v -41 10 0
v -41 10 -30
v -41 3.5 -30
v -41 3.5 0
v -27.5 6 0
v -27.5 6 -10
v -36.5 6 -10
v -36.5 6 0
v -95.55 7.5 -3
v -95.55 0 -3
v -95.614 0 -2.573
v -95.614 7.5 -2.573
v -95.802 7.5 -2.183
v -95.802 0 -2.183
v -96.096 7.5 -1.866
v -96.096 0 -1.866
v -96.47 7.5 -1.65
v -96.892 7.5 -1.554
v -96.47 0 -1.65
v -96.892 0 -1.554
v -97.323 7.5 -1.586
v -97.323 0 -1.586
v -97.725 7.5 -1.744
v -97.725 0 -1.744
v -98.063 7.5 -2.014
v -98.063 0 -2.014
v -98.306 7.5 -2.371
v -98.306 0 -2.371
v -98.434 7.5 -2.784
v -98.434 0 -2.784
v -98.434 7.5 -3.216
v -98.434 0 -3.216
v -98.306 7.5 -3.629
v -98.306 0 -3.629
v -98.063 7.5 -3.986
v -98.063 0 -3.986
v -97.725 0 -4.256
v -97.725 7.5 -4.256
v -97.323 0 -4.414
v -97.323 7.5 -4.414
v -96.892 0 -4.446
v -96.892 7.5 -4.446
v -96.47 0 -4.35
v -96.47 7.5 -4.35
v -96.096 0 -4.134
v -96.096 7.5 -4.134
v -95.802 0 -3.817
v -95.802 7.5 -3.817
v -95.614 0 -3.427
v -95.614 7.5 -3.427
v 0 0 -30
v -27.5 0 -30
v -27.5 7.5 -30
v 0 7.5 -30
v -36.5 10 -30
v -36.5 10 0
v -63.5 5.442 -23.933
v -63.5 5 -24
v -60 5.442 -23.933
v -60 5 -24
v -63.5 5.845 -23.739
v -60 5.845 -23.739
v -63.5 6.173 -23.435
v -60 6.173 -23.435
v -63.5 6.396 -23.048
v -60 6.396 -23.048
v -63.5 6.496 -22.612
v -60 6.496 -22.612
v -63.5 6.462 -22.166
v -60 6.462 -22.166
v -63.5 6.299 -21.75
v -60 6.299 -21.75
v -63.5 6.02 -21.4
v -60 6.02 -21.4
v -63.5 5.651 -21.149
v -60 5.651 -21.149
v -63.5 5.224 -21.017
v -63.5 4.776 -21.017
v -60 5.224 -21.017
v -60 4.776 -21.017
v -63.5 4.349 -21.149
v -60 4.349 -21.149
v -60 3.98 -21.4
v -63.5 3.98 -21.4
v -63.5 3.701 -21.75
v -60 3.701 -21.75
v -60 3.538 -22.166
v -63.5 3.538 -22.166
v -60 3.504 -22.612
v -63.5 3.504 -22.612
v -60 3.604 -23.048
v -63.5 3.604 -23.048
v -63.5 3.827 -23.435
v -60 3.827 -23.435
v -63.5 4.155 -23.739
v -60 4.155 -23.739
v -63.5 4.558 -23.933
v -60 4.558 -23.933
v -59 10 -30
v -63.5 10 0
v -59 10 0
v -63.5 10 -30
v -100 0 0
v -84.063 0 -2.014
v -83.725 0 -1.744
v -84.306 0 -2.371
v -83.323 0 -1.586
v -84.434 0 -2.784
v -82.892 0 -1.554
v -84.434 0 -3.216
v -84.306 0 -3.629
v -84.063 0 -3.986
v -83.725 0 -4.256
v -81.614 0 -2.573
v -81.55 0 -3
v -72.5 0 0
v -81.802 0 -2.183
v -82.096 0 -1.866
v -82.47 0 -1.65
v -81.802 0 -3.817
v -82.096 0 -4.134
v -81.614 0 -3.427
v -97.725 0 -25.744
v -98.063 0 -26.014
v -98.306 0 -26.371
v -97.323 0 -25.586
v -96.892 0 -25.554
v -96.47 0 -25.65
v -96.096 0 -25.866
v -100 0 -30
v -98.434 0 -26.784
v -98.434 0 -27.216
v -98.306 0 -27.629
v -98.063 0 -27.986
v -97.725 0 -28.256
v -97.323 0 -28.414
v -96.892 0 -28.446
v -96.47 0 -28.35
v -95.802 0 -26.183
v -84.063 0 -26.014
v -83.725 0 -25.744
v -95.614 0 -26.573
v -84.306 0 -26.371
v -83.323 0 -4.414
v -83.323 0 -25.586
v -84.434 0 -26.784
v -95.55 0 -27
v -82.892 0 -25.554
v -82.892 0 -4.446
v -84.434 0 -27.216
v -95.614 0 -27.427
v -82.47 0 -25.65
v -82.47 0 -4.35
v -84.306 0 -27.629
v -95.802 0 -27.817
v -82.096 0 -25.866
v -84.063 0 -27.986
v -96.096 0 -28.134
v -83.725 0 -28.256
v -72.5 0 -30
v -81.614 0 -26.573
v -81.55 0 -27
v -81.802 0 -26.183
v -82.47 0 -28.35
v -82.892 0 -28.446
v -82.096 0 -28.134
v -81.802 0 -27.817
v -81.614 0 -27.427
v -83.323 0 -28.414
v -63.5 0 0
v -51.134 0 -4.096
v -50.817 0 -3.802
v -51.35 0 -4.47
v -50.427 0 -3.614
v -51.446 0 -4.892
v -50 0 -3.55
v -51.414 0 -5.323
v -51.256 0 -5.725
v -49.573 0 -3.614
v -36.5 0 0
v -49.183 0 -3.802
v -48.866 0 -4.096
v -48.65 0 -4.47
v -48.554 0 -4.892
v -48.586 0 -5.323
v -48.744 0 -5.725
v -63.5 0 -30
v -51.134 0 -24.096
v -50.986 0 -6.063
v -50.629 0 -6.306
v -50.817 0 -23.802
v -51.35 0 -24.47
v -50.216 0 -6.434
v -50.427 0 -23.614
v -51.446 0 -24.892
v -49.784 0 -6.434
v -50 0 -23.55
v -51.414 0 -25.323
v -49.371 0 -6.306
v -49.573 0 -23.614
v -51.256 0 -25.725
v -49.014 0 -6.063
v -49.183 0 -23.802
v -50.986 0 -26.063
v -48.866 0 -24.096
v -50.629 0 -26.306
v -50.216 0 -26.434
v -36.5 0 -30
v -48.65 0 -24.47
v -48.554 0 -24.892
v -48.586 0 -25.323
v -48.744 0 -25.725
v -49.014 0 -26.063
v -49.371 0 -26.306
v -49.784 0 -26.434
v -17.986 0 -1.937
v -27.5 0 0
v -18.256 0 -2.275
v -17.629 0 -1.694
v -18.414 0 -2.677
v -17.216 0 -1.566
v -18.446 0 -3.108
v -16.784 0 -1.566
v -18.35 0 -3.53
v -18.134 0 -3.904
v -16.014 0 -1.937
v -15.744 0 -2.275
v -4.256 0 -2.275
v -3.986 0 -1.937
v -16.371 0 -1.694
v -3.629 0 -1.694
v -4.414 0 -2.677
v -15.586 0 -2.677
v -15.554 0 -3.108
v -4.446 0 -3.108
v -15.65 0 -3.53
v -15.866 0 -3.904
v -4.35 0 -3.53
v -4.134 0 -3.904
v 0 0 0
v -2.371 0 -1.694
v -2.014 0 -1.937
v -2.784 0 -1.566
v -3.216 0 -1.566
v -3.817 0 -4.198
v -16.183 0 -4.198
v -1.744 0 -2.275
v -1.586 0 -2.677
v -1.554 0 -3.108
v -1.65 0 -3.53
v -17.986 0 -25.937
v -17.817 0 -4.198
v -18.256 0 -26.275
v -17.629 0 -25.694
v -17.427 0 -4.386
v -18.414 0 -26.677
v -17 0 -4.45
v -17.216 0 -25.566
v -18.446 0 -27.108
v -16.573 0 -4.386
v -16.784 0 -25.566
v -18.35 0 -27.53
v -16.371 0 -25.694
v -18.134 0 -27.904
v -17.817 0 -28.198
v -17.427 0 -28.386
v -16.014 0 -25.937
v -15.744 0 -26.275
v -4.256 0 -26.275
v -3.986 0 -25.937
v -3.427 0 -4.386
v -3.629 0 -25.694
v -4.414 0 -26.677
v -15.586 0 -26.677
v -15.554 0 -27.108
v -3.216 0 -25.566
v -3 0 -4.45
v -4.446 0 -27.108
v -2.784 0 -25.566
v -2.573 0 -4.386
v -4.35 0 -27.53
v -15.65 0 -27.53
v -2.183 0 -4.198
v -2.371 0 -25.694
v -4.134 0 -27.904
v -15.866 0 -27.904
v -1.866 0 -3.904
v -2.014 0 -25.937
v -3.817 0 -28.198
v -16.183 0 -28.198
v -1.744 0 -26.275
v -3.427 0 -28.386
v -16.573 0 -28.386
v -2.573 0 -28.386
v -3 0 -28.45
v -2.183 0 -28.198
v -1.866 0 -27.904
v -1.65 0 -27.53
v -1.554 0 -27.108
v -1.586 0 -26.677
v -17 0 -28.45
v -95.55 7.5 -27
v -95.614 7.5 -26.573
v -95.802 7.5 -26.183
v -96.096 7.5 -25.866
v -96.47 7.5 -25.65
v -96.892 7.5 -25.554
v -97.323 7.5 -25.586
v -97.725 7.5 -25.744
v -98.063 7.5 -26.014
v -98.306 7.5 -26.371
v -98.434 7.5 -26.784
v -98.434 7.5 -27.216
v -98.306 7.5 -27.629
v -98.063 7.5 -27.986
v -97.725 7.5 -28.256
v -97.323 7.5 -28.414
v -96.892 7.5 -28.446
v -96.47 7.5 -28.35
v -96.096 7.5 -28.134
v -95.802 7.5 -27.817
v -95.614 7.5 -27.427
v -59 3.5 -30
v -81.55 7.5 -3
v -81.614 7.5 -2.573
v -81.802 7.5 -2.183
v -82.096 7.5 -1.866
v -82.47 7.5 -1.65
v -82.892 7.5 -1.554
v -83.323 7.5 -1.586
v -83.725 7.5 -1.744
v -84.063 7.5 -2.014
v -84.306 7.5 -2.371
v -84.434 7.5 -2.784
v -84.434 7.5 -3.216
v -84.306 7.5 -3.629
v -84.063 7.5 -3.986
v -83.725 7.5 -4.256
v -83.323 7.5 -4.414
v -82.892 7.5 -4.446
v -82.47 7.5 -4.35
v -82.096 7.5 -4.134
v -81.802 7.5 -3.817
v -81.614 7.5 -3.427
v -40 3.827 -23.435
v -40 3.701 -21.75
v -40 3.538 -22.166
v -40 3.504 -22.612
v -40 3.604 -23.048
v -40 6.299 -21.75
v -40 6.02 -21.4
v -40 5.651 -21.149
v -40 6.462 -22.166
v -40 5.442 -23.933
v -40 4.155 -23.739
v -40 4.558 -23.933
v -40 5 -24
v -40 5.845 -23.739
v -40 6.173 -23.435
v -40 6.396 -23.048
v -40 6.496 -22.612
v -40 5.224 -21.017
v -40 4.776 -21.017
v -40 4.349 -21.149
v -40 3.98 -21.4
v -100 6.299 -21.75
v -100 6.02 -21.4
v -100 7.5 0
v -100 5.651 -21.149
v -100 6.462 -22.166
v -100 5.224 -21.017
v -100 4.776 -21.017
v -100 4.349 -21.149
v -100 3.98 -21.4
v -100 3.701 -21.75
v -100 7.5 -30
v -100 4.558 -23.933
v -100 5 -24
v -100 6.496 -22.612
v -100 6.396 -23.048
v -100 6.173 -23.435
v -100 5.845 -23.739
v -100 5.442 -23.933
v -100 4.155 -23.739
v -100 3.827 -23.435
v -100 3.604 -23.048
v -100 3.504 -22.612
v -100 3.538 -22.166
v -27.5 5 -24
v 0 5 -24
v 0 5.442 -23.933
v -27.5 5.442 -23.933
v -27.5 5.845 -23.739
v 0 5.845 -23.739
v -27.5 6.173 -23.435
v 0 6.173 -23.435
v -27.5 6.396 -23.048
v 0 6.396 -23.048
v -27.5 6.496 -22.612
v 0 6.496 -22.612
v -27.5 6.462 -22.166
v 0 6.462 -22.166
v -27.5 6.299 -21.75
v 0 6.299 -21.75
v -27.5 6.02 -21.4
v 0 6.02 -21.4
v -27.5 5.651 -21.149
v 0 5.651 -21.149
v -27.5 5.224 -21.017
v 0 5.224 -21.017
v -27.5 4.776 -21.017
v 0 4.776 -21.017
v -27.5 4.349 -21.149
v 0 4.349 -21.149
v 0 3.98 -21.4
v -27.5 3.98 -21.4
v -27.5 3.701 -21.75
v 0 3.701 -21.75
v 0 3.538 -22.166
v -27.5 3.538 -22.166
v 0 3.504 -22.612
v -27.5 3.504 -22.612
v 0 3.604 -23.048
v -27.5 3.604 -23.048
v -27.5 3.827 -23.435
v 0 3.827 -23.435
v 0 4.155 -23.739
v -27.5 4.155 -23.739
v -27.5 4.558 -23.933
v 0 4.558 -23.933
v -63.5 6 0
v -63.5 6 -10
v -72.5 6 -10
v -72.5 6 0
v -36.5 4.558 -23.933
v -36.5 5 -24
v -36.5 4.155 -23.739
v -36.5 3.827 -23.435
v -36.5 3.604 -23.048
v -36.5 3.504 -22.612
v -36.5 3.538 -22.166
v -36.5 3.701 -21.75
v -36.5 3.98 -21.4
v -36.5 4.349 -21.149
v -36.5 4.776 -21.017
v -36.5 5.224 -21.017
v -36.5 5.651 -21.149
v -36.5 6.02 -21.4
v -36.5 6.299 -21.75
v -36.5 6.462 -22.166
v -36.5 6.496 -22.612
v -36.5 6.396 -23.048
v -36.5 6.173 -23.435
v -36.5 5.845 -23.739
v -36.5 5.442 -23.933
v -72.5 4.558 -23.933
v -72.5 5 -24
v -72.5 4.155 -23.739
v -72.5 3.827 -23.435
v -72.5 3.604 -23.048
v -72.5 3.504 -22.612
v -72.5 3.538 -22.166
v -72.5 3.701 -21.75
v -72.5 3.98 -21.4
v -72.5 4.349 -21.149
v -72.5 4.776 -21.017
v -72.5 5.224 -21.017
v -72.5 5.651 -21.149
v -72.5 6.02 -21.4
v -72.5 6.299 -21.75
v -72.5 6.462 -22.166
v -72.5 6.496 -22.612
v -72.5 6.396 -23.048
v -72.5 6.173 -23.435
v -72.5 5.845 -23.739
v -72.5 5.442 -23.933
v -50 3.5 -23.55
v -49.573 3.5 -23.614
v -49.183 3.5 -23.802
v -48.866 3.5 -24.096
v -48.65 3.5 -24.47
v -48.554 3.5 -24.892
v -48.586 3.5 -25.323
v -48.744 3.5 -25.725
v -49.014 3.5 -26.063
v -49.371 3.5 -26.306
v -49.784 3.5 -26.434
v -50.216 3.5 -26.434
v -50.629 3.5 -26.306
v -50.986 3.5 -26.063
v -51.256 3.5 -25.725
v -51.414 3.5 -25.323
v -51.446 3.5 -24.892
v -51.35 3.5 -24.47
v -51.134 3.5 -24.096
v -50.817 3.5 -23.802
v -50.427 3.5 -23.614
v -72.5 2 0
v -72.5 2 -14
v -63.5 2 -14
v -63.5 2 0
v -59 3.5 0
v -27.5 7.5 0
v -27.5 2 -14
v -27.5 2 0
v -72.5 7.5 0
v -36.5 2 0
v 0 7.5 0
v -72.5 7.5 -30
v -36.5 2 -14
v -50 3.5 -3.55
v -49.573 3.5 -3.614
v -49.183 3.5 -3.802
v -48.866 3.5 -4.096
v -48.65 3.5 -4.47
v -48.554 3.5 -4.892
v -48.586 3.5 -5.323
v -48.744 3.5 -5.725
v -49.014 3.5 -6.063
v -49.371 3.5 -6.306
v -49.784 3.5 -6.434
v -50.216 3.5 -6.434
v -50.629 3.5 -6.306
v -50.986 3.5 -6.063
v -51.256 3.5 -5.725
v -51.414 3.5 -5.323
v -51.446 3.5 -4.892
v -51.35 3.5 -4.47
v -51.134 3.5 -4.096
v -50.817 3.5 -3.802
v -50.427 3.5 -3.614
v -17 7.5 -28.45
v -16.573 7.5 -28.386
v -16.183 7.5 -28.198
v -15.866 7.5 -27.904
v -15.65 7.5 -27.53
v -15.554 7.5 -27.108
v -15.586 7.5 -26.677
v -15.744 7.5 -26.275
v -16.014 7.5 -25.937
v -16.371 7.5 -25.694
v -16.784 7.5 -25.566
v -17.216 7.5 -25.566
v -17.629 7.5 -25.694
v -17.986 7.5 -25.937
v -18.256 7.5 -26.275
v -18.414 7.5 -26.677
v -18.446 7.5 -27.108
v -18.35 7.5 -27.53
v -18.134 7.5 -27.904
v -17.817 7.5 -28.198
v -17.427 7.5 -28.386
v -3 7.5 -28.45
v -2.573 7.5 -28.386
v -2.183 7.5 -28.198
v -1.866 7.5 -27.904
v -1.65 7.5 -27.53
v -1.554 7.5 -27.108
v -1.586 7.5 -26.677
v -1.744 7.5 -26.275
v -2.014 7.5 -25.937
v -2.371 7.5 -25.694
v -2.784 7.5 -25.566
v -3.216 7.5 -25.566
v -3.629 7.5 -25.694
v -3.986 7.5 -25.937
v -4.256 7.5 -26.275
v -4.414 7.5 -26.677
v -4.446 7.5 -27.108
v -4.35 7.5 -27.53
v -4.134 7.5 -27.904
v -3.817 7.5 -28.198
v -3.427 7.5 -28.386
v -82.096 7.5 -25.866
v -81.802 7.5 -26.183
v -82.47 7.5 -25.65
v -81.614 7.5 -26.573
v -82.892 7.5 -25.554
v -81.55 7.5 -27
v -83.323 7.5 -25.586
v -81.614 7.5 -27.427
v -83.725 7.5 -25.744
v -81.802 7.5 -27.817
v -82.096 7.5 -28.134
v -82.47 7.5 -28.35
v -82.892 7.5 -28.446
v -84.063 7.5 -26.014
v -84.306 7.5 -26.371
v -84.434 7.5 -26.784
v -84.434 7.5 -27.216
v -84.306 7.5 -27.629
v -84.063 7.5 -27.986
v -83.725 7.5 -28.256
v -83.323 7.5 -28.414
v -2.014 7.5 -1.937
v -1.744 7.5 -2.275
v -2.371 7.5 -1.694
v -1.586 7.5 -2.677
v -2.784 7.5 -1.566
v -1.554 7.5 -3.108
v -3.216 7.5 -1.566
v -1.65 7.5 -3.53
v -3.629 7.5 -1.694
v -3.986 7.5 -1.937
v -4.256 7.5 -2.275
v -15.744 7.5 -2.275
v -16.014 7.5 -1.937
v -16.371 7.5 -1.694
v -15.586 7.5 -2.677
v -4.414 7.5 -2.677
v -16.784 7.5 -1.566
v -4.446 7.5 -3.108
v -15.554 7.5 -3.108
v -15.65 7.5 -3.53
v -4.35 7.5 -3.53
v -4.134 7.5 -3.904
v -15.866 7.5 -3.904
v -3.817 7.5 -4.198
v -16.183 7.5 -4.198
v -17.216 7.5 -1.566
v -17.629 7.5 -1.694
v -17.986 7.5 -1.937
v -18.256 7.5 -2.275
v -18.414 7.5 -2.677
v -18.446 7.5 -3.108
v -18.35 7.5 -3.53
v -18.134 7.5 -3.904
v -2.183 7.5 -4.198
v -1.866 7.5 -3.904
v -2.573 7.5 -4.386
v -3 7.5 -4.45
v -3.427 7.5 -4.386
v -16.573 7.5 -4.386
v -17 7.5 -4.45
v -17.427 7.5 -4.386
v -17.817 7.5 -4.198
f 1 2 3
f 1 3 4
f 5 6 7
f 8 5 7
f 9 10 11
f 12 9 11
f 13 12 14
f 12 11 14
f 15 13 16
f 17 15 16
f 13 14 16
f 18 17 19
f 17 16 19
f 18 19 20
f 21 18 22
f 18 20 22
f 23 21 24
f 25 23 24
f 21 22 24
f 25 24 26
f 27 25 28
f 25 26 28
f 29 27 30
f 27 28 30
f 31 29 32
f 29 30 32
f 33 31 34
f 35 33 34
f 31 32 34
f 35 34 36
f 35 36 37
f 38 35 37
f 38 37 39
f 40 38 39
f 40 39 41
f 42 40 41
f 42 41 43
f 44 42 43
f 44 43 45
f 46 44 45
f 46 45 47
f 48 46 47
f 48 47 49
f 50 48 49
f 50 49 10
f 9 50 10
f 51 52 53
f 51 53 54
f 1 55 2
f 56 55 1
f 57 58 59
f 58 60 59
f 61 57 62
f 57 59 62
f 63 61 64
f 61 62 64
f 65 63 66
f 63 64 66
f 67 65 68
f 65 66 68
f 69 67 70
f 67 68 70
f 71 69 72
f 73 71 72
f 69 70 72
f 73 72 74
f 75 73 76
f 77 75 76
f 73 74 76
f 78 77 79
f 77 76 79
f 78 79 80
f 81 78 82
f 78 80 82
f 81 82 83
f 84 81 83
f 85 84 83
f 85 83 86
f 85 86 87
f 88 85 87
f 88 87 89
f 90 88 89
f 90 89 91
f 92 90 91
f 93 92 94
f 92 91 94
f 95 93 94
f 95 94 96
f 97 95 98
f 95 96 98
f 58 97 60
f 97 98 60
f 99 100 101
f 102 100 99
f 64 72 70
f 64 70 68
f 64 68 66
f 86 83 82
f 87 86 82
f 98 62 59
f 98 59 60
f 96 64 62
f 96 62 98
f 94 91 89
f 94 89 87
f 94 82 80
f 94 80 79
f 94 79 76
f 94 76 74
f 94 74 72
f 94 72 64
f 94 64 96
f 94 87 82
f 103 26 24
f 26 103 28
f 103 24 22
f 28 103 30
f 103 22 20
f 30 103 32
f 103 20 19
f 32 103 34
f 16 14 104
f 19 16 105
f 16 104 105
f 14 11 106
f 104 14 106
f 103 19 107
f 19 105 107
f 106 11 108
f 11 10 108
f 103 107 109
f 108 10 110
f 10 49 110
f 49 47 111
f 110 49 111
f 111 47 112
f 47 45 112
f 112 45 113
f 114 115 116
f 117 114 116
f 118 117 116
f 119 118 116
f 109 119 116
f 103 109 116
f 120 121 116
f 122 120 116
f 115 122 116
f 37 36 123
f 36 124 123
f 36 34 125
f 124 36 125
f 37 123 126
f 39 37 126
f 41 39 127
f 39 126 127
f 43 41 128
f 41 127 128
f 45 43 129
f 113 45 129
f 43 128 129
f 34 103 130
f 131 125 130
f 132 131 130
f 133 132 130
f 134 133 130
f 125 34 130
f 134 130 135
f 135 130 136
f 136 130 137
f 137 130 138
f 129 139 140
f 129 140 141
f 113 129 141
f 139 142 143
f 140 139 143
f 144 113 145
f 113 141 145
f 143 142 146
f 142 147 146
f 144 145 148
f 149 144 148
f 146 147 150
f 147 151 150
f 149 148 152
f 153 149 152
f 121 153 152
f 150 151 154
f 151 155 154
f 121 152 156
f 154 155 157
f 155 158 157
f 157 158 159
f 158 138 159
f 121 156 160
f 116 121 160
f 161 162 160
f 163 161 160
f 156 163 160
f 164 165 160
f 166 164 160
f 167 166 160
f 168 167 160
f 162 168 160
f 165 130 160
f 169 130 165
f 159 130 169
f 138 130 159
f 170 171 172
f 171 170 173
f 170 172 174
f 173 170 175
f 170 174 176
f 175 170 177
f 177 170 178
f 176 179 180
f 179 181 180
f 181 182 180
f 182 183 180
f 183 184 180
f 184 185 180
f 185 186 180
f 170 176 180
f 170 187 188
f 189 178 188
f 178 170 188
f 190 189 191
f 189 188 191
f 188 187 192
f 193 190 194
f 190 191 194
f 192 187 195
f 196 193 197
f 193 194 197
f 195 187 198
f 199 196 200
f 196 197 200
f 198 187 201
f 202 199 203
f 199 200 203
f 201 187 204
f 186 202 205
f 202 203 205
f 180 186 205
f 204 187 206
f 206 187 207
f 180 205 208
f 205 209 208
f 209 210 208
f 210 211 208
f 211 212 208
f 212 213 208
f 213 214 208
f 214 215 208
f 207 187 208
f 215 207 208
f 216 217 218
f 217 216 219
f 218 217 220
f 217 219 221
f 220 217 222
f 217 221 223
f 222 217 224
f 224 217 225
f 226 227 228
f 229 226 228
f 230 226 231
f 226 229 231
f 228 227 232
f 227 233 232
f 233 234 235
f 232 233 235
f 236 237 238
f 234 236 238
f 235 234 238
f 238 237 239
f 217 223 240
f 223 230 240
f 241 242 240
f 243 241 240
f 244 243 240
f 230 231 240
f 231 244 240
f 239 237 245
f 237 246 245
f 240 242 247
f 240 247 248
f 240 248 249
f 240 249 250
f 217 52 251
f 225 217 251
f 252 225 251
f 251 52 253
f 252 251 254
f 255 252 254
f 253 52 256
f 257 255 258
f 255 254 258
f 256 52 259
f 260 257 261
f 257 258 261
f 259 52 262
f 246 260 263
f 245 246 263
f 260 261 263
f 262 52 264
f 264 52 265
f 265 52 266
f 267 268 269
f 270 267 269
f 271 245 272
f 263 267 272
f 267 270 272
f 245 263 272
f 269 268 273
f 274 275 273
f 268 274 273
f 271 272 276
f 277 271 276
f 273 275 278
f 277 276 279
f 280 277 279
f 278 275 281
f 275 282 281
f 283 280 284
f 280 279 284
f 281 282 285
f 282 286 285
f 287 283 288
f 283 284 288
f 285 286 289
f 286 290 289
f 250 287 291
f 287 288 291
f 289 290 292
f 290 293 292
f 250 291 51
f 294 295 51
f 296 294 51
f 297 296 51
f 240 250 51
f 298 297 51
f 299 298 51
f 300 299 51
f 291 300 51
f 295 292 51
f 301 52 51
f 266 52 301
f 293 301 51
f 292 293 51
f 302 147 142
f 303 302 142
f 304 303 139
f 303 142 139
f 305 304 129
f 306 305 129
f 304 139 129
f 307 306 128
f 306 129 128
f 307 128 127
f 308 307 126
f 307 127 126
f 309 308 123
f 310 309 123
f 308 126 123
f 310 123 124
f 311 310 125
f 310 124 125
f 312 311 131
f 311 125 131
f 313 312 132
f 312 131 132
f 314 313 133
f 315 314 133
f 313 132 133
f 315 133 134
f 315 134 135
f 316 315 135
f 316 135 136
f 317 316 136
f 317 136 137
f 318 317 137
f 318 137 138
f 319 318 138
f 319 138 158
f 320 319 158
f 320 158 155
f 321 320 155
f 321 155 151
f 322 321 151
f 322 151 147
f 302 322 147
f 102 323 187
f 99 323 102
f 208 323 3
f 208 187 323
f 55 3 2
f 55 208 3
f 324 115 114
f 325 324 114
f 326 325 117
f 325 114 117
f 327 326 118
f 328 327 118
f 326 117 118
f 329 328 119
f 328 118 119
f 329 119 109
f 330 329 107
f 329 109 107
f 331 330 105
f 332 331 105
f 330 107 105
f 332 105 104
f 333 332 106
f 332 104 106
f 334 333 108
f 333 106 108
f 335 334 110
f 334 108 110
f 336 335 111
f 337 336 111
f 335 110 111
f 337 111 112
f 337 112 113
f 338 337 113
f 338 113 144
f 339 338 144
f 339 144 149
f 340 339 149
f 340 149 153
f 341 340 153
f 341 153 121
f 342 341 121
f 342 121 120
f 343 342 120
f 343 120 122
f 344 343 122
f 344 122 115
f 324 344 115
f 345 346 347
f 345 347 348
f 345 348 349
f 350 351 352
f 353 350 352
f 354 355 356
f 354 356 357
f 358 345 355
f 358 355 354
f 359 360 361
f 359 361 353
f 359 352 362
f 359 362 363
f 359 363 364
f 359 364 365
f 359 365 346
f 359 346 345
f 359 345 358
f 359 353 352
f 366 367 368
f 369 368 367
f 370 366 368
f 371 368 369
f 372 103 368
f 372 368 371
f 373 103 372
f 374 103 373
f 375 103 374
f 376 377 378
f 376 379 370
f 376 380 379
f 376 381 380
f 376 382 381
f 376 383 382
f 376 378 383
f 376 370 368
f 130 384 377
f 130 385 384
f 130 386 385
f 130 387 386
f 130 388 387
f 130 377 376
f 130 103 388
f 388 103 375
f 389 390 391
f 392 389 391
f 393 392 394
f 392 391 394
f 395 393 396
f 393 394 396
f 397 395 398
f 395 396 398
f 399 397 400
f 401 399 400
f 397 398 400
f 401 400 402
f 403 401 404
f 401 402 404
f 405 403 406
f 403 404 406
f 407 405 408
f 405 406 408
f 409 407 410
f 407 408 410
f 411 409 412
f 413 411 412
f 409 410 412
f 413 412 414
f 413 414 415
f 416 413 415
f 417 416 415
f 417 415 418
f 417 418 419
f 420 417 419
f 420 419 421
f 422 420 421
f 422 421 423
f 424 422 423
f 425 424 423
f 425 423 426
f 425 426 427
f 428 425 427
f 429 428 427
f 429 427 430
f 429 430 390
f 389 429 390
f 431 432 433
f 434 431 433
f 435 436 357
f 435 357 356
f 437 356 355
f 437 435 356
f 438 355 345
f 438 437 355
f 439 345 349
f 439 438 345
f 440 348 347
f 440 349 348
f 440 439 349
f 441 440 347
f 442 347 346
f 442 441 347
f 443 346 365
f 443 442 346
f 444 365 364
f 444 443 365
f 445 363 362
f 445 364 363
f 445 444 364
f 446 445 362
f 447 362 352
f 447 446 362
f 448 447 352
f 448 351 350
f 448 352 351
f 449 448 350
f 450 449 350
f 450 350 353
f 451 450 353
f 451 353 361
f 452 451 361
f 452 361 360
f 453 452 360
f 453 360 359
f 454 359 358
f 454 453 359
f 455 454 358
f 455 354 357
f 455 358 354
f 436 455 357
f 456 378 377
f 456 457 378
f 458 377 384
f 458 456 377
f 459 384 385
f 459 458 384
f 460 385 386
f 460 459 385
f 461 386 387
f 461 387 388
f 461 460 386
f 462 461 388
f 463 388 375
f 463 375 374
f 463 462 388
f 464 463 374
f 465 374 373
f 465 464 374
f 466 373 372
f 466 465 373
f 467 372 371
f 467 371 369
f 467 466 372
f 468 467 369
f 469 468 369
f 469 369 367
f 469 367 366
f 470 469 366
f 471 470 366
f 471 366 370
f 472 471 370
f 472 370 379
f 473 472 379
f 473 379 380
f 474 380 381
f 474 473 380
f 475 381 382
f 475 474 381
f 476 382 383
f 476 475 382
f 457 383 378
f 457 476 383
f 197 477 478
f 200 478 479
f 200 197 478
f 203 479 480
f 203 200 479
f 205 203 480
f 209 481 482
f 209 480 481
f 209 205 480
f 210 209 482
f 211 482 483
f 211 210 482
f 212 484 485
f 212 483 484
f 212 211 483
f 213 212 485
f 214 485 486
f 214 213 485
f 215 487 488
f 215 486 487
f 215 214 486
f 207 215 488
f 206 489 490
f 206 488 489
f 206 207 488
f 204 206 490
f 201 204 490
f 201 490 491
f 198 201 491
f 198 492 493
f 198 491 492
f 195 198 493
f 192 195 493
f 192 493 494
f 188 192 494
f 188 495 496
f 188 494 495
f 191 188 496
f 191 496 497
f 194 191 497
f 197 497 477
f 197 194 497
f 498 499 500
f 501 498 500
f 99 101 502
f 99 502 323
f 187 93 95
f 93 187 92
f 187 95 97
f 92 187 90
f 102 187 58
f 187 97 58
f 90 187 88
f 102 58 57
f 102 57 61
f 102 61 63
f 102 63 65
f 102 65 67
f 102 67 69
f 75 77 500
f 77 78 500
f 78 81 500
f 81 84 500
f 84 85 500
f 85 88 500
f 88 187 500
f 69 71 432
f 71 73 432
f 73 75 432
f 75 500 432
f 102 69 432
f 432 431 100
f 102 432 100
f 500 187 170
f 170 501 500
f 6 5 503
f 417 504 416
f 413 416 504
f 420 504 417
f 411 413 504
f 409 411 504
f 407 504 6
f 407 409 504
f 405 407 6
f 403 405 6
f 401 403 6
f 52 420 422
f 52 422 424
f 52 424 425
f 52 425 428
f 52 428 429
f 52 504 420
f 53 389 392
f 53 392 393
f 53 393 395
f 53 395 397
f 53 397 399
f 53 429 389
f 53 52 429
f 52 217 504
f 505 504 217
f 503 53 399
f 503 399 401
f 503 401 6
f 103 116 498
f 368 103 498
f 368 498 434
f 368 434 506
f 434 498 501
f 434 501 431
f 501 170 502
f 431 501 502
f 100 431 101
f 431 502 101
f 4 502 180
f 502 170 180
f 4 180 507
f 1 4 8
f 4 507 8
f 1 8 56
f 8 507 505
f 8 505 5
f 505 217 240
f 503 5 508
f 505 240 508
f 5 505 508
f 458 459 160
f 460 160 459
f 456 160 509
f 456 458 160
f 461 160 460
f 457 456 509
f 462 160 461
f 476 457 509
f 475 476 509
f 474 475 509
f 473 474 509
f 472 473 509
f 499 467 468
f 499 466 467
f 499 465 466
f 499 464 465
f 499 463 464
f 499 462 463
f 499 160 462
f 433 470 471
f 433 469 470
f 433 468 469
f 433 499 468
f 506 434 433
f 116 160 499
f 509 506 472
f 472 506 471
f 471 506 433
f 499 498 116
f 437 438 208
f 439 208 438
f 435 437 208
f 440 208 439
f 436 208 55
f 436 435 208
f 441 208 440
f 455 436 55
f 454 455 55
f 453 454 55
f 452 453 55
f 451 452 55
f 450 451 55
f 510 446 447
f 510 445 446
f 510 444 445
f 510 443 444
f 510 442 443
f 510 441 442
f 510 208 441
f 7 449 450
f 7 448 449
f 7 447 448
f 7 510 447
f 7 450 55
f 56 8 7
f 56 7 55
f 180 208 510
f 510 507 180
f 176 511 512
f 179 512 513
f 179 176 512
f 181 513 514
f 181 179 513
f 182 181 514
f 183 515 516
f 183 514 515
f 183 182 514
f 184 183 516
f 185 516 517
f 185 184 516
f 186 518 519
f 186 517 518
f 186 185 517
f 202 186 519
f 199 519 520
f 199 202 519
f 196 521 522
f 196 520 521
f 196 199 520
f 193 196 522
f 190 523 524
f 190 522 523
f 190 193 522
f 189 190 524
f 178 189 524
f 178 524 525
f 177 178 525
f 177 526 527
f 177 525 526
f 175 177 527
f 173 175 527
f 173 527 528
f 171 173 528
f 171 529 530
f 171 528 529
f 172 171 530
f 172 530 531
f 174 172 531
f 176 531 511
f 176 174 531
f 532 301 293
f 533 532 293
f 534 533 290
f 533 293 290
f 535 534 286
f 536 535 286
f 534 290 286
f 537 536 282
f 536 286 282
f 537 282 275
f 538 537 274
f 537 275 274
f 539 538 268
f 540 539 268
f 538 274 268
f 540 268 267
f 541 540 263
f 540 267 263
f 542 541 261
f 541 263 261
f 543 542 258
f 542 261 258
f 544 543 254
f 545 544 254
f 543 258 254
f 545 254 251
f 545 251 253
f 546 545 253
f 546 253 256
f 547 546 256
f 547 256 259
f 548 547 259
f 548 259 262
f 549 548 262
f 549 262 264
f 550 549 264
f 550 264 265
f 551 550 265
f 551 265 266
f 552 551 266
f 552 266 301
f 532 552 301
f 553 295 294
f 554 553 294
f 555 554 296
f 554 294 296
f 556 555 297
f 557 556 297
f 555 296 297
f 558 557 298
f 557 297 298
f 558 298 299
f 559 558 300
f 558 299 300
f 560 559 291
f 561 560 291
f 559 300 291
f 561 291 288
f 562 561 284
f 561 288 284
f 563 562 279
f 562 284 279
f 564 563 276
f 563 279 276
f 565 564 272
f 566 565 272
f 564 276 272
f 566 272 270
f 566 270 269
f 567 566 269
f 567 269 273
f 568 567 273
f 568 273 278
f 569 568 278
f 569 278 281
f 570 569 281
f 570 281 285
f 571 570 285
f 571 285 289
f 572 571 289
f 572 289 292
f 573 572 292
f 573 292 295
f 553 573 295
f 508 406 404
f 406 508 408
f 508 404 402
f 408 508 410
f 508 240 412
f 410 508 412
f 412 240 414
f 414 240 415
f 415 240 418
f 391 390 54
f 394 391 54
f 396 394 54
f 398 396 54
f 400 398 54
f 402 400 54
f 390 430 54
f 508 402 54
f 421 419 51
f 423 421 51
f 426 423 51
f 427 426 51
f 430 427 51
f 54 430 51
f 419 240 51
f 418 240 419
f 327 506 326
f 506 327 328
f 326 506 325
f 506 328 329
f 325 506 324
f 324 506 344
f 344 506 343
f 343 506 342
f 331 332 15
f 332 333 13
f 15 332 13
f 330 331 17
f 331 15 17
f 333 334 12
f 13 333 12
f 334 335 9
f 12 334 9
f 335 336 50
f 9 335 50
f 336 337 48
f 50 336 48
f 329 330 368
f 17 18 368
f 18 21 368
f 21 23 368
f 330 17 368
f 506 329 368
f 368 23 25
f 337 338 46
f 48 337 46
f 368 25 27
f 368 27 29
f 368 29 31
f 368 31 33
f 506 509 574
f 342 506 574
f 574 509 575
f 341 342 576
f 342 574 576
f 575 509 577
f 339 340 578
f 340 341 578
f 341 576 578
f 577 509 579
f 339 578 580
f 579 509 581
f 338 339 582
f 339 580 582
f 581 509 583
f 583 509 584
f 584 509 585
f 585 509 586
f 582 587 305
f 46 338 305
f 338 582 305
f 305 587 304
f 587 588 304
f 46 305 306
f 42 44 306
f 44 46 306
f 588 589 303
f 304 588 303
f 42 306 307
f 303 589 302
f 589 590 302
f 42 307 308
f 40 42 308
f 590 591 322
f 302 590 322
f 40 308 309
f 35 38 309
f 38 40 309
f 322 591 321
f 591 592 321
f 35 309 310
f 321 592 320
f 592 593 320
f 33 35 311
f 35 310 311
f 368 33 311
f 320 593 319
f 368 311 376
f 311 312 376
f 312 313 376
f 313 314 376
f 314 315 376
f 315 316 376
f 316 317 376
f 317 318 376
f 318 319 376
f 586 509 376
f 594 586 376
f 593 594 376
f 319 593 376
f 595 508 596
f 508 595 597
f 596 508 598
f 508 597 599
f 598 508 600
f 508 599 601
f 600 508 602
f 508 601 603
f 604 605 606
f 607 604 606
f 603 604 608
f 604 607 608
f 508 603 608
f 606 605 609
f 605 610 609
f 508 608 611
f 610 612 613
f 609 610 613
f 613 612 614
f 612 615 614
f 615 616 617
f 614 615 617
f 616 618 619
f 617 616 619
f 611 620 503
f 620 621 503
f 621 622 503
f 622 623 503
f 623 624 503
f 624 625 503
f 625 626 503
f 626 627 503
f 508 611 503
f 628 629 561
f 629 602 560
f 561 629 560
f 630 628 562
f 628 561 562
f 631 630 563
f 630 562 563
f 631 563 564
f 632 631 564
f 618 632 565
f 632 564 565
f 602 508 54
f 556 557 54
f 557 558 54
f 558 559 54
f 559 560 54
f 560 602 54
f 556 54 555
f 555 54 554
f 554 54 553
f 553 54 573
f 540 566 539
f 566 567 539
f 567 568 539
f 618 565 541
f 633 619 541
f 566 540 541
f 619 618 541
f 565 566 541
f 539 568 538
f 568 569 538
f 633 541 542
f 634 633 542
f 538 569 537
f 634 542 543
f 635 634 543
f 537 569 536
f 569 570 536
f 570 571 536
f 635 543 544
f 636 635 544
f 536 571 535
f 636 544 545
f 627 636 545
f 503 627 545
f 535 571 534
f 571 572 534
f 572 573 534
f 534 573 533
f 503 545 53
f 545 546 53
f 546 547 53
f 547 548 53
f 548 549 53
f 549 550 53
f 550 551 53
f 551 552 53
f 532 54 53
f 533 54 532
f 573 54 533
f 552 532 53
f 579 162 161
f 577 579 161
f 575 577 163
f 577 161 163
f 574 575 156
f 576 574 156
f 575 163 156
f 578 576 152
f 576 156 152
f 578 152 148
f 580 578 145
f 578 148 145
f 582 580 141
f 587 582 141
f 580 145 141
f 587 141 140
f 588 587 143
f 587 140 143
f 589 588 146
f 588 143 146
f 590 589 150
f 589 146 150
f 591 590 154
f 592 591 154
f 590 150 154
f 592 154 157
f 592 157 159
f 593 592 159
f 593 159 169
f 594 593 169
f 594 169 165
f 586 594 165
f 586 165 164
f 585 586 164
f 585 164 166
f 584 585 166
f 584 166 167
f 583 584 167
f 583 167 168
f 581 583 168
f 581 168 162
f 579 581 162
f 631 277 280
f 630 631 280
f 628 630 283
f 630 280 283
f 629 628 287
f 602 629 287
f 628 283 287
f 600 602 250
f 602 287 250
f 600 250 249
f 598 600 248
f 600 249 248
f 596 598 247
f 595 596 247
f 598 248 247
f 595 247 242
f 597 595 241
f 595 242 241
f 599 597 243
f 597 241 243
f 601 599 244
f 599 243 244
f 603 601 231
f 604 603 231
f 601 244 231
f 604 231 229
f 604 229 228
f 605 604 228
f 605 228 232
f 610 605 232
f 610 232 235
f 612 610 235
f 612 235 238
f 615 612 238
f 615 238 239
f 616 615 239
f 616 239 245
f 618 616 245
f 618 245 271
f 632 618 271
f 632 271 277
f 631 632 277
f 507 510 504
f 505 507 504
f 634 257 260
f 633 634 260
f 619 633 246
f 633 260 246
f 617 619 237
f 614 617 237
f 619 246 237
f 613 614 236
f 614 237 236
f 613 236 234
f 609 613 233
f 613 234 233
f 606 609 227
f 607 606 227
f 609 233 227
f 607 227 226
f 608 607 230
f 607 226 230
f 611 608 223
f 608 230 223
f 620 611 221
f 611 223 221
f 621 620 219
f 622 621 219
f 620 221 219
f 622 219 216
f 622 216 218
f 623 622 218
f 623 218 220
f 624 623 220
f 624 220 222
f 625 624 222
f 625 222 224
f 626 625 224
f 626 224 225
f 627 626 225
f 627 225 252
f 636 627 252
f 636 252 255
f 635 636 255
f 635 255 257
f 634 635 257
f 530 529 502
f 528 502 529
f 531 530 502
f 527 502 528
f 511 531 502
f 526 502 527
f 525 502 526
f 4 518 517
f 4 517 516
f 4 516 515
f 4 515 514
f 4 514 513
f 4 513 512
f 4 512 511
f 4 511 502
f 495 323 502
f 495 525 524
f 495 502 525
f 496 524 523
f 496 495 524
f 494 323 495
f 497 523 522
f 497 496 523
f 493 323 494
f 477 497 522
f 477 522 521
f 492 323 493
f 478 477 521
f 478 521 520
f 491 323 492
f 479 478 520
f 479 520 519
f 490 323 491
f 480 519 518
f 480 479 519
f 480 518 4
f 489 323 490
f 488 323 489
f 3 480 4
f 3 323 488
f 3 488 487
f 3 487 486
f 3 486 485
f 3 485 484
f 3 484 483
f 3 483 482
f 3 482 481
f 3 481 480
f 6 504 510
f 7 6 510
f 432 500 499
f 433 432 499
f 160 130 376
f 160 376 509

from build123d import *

# Parameters (mm, degrees)
SKETCH_1_W           = 100
SKETCH_1_H           = 30
SKETCH_1_R           = 1.45
EXTRUDE_1_DEPTH      = 10
SKETCH_2_W           = 24
SKETCH_2_H           = 30
CUT_EXTRUDE_1_DEPTH  = 6.5
SKETCH_3_W           = 9
SKETCH_3_H           = 15
CUT_EXTRUDE_2_DEPTH  = 16.5
SKETCH_4_W           = 9
SKETCH_4_H           = 4
CUT_EXTRUDE_3_DEPTH  = 16.5
SKETCH_6_R           = 1.5
CUT_EXTRUDE_4_DEPTH  = 16
CUT_EXTRUDE_START    = -8
SKETCH_7_R           = 1.5
CUT_EXTRUDE_5_DEPTH  = 8
CHAMFER_1_SIZE       = 5
CUT_EXTRUDE_START_2  = -30
SKETCH_10_R          = 1.5
CUT_EXTRUDE_8_DEPTH  = 30
SKETCH_11_R          = 1.5
CUT_EXTRUDE_9_DEPTH  = 30
SKETCH_15_W          = 27.5
SKETCH_15_H          = 2.5
CUT_EXTRUDE_14_DEPTH = 30
CUT_EXTRUDE_15_REACH = 106.881
SKETCH_16_W          = 9
SKETCH_16_H          = 2
SKETCH_19_R          = 1.45
CUT_EXTRUDE_18_DEPTH = 105.880884817
SKETCH_21_W          = 30
SKETCH_21_H          = 6.5
EXTRUDE_2_DEPTH      = 3
CUT_EXTRUDE_START_3  = -2
SKETCH_22_R          = 1.5
CUT_EXTRUDE_19_DEPTH = 2
SKETCH_23_W          = 30
SKETCH_23_H          = 6.5
EXTRUDE_3_DEPTH      = 3
SKETCH_24_R          = 1.5
CUT_EXTRUDE_20_DEPTH = 2


with BuildPart() as part:
    # 草图1 → 凸台-拉伸1 (new body)
    with BuildSketch(Plane(origin=(0, 0, 0), x_dir=(1, 0, 0), z_dir=(0, 1, 0))):
        with Locations((-50, 15)):
            Rectangle(SKETCH_1_W, SKETCH_1_H)
        with Locations(Location((-50, 25, 0), (0, 0, 270))):
            Circle(SKETCH_1_R, mode=Mode.SUBTRACT)
        with Locations(Location((-50, 5, 0), (0, 0, 270))):
            Circle(SKETCH_1_R, mode=Mode.SUBTRACT)
    extrude(amount=EXTRUDE_1_DEPTH)

    # 草图2 → 切除-拉伸1 (cut)
    with BuildSketch(Plane(origin=(0, 10, 0), x_dir=(1, 0, 0), z_dir=(0, 1, 0))):
        with Locations((-50, 15)):
            Rectangle(SKETCH_2_W, SKETCH_2_H)
    extrude(amount=-CUT_EXTRUDE_1_DEPTH, mode=Mode.SUBTRACT)

    # 草图3 → 切除-拉伸2 (cut)
    with BuildSketch(Plane(origin=(0, 10, 0), x_dir=(1, 0, 0), z_dir=(0, 1, 0))):
        with Locations((-68, 22.5)):
            Rectangle(SKETCH_3_W, SKETCH_3_H)
        with Locations((-32, 22.5)):
            Rectangle(SKETCH_3_W, SKETCH_3_H)
    extrude(amount=-CUT_EXTRUDE_2_DEPTH, mode=Mode.SUBTRACT)

    # 草图4 → 切除-拉伸3 (cut)
    with BuildSketch(Plane(origin=(0, 0, -15), x_dir=(-1, 0, 0), z_dir=(0, 0, -1))):
        with Locations((68, 8)):
            Rectangle(SKETCH_4_W, SKETCH_4_H)
        with Locations((32, 8)):
            Rectangle(SKETCH_4_W, SKETCH_4_H)
    extrude(amount=-CUT_EXTRUDE_3_DEPTH, mode=Mode.SUBTRACT)

    # 草图6 → 切除-拉伸4 (cut)
    with BuildSketch(Plane(origin=(-62, 0, 0), x_dir=(0, 0, -1), z_dir=(1, 0, 0))):
        with Locations((22.5, 5)):
            Circle(SKETCH_6_R)
    extrude(amount=-CUT_EXTRUDE_4_DEPTH, mode=Mode.SUBTRACT)

    # 草图7 → 切除-拉伸5 (cut)
    with BuildSketch(Plane.ZY.offset(38).offset(CUT_EXTRUDE_START)):
        with Locations(Location((-22.5, 5, 0), (0, 0, 180))):
            Circle(SKETCH_7_R)
    extrude(amount=CUT_EXTRUDE_5_DEPTH, mode=Mode.SUBTRACT)

    # 倒角1
    chamfer_1_edges = [part.edges().sort_by_distance(p)[0] for p in [
        (-32, 6, -15),
        (-68, 6, -15),
    ]]
    chamfer(chamfer_1_edges, length=CHAMFER_1_SIZE)

    # 草图10 → 切除-拉伸8 (cut)
    with BuildSketch(Plane(origin=(-100, -149.284504662, 244.723777946), x_dir=(0, 0, 1), z_dir=(-1, 0, 0)).offset(CUT_EXTRUDE_START_2)):
        with Locations(Location((-267.223777946, 154.284504662, 0), (0, 0, 180))):
            Circle(SKETCH_10_R)
    extrude(amount=CUT_EXTRUDE_8_DEPTH, mode=Mode.SUBTRACT)

    # 草图11 → 切除-拉伸9 (cut)
    with BuildSketch(Plane(origin=(0, -149.284504662, 244.723777946), x_dir=(0, 0, -1), z_dir=(1, 0, 0))):
        with Locations((267.223777946, 154.284504662)):
            Circle(SKETCH_11_R)
    extrude(amount=-CUT_EXTRUDE_9_DEPTH, mode=Mode.SUBTRACT)

    # 草图15 → 切除-拉伸14 (cut)
    with BuildSketch(Plane(origin=(0, 0, -30), x_dir=(-1, 0, 0), z_dir=(0, 0, -1))):
        with Locations((13.75, 8.75)):
            Rectangle(SKETCH_15_W, SKETCH_15_H)
        with Locations((86.25, 8.75)):
            Rectangle(SKETCH_15_W, SKETCH_15_H)
    extrude(amount=-CUT_EXTRUDE_14_DEPTH, mode=Mode.SUBTRACT)

    # 切除-拉伸15: up to this plane
    cut_extrude_15_end = Plane(origin=(-63.5, 6, -10), z_dir=(0, -0.7071067811865456, 0.7071067811865495))
    # 草图16 → 切除-拉伸15 (cut, up to the surface)
    with BuildSketch(Plane.XY, mode=Mode.PRIVATE) as cut_extrude_15_sk1:
        with Locations((-68, 1)):
            Rectangle(SKETCH_16_W, SKETCH_16_H)
    cut_extrude_15_tool1 = split(extrude(cut_extrude_15_sk1.sketch, amount=-CUT_EXTRUDE_15_REACH, mode=Mode.PRIVATE), bisect_by=cut_extrude_15_end, keep=Keep.BOTH, mode=Mode.PRIVATE)
    add(cut_extrude_15_tool1.solids().sort_by_distance((-68, 1, 0))[0], mode=Mode.SUBTRACT)
    # 草图16 → 切除-拉伸15 (cut, up to the surface)
    with BuildSketch(Plane.XY, mode=Mode.PRIVATE) as cut_extrude_15_sk2:
        with Locations((-32, 1)):
            Rectangle(SKETCH_16_W, SKETCH_16_H)
    cut_extrude_15_tool2 = split(extrude(cut_extrude_15_sk2.sketch, amount=-CUT_EXTRUDE_15_REACH, mode=Mode.PRIVATE), bisect_by=cut_extrude_15_end, keep=Keep.BOTH, mode=Mode.PRIVATE)
    add(cut_extrude_15_tool2.solids().sort_by_distance((-32, 1, 0))[0], mode=Mode.SUBTRACT)

    # 草图19 → 切除-拉伸18 (cut, through all)
    with BuildSketch(Plane.XZ):
        with Locations(Location((-3, -3, 0), (0, 0, 270))):
            Circle(SKETCH_19_R)
        with Locations(Location((-17, -3, 0), (0, 0, 270))):
            Circle(SKETCH_19_R)
        with Locations(Location((-17, -27, 0), (0, 0, 270))):
            Circle(SKETCH_19_R)
        with Locations(Location((-3, -27, 0), (0, 0, 270))):
            Circle(SKETCH_19_R)
        with Locations((-97, -27)):
            Circle(SKETCH_19_R)
        with Locations((-83, -27)):
            Circle(SKETCH_19_R)
        with Locations((-83, -3)):
            Circle(SKETCH_19_R)
        with Locations((-97, -3)):
            Circle(SKETCH_19_R)
    extrude(amount=-CUT_EXTRUDE_18_DEPTH, mode=Mode.SUBTRACT)

    # 草图21 → 凸台-拉伸2 (add)
    with BuildSketch(Plane(origin=(-62, 0, 0), x_dir=(0, 0, -1), z_dir=(1, 0, 0))):
        with Locations((15, 6.75)):
            Rectangle(SKETCH_21_W, SKETCH_21_H)
    extrude(amount=EXTRUDE_2_DEPTH)

    # 草图22 → 切除-拉伸19 (cut)
    with BuildSketch(Plane.ZY.offset(62).offset(CUT_EXTRUDE_START_3)):
        with Locations(Location((-22.5, 5, 0), (0, 0, 180))):
            Circle(SKETCH_22_R)
    extrude(amount=CUT_EXTRUDE_19_DEPTH, mode=Mode.SUBTRACT)

    # 草图23 → 凸台-拉伸3 (add)
    with BuildSketch(Plane.ZY.offset(38)):
        with Locations((-15, 6.75)):
            Rectangle(SKETCH_23_W, SKETCH_23_H)
    extrude(amount=EXTRUDE_3_DEPTH)

    # 草图24 → 切除-拉伸20 (cut)
    with BuildSketch(Plane(origin=(-38, 0, 0), x_dir=(0, 0, -1), z_dir=(1, 0, 0))):
        with Locations((22.5, 5)):
            Circle(SKETCH_24_R)
    extrude(amount=-CUT_EXTRUDE_20_DEPTH, mode=Mode.SUBTRACT)


solid = part.part
